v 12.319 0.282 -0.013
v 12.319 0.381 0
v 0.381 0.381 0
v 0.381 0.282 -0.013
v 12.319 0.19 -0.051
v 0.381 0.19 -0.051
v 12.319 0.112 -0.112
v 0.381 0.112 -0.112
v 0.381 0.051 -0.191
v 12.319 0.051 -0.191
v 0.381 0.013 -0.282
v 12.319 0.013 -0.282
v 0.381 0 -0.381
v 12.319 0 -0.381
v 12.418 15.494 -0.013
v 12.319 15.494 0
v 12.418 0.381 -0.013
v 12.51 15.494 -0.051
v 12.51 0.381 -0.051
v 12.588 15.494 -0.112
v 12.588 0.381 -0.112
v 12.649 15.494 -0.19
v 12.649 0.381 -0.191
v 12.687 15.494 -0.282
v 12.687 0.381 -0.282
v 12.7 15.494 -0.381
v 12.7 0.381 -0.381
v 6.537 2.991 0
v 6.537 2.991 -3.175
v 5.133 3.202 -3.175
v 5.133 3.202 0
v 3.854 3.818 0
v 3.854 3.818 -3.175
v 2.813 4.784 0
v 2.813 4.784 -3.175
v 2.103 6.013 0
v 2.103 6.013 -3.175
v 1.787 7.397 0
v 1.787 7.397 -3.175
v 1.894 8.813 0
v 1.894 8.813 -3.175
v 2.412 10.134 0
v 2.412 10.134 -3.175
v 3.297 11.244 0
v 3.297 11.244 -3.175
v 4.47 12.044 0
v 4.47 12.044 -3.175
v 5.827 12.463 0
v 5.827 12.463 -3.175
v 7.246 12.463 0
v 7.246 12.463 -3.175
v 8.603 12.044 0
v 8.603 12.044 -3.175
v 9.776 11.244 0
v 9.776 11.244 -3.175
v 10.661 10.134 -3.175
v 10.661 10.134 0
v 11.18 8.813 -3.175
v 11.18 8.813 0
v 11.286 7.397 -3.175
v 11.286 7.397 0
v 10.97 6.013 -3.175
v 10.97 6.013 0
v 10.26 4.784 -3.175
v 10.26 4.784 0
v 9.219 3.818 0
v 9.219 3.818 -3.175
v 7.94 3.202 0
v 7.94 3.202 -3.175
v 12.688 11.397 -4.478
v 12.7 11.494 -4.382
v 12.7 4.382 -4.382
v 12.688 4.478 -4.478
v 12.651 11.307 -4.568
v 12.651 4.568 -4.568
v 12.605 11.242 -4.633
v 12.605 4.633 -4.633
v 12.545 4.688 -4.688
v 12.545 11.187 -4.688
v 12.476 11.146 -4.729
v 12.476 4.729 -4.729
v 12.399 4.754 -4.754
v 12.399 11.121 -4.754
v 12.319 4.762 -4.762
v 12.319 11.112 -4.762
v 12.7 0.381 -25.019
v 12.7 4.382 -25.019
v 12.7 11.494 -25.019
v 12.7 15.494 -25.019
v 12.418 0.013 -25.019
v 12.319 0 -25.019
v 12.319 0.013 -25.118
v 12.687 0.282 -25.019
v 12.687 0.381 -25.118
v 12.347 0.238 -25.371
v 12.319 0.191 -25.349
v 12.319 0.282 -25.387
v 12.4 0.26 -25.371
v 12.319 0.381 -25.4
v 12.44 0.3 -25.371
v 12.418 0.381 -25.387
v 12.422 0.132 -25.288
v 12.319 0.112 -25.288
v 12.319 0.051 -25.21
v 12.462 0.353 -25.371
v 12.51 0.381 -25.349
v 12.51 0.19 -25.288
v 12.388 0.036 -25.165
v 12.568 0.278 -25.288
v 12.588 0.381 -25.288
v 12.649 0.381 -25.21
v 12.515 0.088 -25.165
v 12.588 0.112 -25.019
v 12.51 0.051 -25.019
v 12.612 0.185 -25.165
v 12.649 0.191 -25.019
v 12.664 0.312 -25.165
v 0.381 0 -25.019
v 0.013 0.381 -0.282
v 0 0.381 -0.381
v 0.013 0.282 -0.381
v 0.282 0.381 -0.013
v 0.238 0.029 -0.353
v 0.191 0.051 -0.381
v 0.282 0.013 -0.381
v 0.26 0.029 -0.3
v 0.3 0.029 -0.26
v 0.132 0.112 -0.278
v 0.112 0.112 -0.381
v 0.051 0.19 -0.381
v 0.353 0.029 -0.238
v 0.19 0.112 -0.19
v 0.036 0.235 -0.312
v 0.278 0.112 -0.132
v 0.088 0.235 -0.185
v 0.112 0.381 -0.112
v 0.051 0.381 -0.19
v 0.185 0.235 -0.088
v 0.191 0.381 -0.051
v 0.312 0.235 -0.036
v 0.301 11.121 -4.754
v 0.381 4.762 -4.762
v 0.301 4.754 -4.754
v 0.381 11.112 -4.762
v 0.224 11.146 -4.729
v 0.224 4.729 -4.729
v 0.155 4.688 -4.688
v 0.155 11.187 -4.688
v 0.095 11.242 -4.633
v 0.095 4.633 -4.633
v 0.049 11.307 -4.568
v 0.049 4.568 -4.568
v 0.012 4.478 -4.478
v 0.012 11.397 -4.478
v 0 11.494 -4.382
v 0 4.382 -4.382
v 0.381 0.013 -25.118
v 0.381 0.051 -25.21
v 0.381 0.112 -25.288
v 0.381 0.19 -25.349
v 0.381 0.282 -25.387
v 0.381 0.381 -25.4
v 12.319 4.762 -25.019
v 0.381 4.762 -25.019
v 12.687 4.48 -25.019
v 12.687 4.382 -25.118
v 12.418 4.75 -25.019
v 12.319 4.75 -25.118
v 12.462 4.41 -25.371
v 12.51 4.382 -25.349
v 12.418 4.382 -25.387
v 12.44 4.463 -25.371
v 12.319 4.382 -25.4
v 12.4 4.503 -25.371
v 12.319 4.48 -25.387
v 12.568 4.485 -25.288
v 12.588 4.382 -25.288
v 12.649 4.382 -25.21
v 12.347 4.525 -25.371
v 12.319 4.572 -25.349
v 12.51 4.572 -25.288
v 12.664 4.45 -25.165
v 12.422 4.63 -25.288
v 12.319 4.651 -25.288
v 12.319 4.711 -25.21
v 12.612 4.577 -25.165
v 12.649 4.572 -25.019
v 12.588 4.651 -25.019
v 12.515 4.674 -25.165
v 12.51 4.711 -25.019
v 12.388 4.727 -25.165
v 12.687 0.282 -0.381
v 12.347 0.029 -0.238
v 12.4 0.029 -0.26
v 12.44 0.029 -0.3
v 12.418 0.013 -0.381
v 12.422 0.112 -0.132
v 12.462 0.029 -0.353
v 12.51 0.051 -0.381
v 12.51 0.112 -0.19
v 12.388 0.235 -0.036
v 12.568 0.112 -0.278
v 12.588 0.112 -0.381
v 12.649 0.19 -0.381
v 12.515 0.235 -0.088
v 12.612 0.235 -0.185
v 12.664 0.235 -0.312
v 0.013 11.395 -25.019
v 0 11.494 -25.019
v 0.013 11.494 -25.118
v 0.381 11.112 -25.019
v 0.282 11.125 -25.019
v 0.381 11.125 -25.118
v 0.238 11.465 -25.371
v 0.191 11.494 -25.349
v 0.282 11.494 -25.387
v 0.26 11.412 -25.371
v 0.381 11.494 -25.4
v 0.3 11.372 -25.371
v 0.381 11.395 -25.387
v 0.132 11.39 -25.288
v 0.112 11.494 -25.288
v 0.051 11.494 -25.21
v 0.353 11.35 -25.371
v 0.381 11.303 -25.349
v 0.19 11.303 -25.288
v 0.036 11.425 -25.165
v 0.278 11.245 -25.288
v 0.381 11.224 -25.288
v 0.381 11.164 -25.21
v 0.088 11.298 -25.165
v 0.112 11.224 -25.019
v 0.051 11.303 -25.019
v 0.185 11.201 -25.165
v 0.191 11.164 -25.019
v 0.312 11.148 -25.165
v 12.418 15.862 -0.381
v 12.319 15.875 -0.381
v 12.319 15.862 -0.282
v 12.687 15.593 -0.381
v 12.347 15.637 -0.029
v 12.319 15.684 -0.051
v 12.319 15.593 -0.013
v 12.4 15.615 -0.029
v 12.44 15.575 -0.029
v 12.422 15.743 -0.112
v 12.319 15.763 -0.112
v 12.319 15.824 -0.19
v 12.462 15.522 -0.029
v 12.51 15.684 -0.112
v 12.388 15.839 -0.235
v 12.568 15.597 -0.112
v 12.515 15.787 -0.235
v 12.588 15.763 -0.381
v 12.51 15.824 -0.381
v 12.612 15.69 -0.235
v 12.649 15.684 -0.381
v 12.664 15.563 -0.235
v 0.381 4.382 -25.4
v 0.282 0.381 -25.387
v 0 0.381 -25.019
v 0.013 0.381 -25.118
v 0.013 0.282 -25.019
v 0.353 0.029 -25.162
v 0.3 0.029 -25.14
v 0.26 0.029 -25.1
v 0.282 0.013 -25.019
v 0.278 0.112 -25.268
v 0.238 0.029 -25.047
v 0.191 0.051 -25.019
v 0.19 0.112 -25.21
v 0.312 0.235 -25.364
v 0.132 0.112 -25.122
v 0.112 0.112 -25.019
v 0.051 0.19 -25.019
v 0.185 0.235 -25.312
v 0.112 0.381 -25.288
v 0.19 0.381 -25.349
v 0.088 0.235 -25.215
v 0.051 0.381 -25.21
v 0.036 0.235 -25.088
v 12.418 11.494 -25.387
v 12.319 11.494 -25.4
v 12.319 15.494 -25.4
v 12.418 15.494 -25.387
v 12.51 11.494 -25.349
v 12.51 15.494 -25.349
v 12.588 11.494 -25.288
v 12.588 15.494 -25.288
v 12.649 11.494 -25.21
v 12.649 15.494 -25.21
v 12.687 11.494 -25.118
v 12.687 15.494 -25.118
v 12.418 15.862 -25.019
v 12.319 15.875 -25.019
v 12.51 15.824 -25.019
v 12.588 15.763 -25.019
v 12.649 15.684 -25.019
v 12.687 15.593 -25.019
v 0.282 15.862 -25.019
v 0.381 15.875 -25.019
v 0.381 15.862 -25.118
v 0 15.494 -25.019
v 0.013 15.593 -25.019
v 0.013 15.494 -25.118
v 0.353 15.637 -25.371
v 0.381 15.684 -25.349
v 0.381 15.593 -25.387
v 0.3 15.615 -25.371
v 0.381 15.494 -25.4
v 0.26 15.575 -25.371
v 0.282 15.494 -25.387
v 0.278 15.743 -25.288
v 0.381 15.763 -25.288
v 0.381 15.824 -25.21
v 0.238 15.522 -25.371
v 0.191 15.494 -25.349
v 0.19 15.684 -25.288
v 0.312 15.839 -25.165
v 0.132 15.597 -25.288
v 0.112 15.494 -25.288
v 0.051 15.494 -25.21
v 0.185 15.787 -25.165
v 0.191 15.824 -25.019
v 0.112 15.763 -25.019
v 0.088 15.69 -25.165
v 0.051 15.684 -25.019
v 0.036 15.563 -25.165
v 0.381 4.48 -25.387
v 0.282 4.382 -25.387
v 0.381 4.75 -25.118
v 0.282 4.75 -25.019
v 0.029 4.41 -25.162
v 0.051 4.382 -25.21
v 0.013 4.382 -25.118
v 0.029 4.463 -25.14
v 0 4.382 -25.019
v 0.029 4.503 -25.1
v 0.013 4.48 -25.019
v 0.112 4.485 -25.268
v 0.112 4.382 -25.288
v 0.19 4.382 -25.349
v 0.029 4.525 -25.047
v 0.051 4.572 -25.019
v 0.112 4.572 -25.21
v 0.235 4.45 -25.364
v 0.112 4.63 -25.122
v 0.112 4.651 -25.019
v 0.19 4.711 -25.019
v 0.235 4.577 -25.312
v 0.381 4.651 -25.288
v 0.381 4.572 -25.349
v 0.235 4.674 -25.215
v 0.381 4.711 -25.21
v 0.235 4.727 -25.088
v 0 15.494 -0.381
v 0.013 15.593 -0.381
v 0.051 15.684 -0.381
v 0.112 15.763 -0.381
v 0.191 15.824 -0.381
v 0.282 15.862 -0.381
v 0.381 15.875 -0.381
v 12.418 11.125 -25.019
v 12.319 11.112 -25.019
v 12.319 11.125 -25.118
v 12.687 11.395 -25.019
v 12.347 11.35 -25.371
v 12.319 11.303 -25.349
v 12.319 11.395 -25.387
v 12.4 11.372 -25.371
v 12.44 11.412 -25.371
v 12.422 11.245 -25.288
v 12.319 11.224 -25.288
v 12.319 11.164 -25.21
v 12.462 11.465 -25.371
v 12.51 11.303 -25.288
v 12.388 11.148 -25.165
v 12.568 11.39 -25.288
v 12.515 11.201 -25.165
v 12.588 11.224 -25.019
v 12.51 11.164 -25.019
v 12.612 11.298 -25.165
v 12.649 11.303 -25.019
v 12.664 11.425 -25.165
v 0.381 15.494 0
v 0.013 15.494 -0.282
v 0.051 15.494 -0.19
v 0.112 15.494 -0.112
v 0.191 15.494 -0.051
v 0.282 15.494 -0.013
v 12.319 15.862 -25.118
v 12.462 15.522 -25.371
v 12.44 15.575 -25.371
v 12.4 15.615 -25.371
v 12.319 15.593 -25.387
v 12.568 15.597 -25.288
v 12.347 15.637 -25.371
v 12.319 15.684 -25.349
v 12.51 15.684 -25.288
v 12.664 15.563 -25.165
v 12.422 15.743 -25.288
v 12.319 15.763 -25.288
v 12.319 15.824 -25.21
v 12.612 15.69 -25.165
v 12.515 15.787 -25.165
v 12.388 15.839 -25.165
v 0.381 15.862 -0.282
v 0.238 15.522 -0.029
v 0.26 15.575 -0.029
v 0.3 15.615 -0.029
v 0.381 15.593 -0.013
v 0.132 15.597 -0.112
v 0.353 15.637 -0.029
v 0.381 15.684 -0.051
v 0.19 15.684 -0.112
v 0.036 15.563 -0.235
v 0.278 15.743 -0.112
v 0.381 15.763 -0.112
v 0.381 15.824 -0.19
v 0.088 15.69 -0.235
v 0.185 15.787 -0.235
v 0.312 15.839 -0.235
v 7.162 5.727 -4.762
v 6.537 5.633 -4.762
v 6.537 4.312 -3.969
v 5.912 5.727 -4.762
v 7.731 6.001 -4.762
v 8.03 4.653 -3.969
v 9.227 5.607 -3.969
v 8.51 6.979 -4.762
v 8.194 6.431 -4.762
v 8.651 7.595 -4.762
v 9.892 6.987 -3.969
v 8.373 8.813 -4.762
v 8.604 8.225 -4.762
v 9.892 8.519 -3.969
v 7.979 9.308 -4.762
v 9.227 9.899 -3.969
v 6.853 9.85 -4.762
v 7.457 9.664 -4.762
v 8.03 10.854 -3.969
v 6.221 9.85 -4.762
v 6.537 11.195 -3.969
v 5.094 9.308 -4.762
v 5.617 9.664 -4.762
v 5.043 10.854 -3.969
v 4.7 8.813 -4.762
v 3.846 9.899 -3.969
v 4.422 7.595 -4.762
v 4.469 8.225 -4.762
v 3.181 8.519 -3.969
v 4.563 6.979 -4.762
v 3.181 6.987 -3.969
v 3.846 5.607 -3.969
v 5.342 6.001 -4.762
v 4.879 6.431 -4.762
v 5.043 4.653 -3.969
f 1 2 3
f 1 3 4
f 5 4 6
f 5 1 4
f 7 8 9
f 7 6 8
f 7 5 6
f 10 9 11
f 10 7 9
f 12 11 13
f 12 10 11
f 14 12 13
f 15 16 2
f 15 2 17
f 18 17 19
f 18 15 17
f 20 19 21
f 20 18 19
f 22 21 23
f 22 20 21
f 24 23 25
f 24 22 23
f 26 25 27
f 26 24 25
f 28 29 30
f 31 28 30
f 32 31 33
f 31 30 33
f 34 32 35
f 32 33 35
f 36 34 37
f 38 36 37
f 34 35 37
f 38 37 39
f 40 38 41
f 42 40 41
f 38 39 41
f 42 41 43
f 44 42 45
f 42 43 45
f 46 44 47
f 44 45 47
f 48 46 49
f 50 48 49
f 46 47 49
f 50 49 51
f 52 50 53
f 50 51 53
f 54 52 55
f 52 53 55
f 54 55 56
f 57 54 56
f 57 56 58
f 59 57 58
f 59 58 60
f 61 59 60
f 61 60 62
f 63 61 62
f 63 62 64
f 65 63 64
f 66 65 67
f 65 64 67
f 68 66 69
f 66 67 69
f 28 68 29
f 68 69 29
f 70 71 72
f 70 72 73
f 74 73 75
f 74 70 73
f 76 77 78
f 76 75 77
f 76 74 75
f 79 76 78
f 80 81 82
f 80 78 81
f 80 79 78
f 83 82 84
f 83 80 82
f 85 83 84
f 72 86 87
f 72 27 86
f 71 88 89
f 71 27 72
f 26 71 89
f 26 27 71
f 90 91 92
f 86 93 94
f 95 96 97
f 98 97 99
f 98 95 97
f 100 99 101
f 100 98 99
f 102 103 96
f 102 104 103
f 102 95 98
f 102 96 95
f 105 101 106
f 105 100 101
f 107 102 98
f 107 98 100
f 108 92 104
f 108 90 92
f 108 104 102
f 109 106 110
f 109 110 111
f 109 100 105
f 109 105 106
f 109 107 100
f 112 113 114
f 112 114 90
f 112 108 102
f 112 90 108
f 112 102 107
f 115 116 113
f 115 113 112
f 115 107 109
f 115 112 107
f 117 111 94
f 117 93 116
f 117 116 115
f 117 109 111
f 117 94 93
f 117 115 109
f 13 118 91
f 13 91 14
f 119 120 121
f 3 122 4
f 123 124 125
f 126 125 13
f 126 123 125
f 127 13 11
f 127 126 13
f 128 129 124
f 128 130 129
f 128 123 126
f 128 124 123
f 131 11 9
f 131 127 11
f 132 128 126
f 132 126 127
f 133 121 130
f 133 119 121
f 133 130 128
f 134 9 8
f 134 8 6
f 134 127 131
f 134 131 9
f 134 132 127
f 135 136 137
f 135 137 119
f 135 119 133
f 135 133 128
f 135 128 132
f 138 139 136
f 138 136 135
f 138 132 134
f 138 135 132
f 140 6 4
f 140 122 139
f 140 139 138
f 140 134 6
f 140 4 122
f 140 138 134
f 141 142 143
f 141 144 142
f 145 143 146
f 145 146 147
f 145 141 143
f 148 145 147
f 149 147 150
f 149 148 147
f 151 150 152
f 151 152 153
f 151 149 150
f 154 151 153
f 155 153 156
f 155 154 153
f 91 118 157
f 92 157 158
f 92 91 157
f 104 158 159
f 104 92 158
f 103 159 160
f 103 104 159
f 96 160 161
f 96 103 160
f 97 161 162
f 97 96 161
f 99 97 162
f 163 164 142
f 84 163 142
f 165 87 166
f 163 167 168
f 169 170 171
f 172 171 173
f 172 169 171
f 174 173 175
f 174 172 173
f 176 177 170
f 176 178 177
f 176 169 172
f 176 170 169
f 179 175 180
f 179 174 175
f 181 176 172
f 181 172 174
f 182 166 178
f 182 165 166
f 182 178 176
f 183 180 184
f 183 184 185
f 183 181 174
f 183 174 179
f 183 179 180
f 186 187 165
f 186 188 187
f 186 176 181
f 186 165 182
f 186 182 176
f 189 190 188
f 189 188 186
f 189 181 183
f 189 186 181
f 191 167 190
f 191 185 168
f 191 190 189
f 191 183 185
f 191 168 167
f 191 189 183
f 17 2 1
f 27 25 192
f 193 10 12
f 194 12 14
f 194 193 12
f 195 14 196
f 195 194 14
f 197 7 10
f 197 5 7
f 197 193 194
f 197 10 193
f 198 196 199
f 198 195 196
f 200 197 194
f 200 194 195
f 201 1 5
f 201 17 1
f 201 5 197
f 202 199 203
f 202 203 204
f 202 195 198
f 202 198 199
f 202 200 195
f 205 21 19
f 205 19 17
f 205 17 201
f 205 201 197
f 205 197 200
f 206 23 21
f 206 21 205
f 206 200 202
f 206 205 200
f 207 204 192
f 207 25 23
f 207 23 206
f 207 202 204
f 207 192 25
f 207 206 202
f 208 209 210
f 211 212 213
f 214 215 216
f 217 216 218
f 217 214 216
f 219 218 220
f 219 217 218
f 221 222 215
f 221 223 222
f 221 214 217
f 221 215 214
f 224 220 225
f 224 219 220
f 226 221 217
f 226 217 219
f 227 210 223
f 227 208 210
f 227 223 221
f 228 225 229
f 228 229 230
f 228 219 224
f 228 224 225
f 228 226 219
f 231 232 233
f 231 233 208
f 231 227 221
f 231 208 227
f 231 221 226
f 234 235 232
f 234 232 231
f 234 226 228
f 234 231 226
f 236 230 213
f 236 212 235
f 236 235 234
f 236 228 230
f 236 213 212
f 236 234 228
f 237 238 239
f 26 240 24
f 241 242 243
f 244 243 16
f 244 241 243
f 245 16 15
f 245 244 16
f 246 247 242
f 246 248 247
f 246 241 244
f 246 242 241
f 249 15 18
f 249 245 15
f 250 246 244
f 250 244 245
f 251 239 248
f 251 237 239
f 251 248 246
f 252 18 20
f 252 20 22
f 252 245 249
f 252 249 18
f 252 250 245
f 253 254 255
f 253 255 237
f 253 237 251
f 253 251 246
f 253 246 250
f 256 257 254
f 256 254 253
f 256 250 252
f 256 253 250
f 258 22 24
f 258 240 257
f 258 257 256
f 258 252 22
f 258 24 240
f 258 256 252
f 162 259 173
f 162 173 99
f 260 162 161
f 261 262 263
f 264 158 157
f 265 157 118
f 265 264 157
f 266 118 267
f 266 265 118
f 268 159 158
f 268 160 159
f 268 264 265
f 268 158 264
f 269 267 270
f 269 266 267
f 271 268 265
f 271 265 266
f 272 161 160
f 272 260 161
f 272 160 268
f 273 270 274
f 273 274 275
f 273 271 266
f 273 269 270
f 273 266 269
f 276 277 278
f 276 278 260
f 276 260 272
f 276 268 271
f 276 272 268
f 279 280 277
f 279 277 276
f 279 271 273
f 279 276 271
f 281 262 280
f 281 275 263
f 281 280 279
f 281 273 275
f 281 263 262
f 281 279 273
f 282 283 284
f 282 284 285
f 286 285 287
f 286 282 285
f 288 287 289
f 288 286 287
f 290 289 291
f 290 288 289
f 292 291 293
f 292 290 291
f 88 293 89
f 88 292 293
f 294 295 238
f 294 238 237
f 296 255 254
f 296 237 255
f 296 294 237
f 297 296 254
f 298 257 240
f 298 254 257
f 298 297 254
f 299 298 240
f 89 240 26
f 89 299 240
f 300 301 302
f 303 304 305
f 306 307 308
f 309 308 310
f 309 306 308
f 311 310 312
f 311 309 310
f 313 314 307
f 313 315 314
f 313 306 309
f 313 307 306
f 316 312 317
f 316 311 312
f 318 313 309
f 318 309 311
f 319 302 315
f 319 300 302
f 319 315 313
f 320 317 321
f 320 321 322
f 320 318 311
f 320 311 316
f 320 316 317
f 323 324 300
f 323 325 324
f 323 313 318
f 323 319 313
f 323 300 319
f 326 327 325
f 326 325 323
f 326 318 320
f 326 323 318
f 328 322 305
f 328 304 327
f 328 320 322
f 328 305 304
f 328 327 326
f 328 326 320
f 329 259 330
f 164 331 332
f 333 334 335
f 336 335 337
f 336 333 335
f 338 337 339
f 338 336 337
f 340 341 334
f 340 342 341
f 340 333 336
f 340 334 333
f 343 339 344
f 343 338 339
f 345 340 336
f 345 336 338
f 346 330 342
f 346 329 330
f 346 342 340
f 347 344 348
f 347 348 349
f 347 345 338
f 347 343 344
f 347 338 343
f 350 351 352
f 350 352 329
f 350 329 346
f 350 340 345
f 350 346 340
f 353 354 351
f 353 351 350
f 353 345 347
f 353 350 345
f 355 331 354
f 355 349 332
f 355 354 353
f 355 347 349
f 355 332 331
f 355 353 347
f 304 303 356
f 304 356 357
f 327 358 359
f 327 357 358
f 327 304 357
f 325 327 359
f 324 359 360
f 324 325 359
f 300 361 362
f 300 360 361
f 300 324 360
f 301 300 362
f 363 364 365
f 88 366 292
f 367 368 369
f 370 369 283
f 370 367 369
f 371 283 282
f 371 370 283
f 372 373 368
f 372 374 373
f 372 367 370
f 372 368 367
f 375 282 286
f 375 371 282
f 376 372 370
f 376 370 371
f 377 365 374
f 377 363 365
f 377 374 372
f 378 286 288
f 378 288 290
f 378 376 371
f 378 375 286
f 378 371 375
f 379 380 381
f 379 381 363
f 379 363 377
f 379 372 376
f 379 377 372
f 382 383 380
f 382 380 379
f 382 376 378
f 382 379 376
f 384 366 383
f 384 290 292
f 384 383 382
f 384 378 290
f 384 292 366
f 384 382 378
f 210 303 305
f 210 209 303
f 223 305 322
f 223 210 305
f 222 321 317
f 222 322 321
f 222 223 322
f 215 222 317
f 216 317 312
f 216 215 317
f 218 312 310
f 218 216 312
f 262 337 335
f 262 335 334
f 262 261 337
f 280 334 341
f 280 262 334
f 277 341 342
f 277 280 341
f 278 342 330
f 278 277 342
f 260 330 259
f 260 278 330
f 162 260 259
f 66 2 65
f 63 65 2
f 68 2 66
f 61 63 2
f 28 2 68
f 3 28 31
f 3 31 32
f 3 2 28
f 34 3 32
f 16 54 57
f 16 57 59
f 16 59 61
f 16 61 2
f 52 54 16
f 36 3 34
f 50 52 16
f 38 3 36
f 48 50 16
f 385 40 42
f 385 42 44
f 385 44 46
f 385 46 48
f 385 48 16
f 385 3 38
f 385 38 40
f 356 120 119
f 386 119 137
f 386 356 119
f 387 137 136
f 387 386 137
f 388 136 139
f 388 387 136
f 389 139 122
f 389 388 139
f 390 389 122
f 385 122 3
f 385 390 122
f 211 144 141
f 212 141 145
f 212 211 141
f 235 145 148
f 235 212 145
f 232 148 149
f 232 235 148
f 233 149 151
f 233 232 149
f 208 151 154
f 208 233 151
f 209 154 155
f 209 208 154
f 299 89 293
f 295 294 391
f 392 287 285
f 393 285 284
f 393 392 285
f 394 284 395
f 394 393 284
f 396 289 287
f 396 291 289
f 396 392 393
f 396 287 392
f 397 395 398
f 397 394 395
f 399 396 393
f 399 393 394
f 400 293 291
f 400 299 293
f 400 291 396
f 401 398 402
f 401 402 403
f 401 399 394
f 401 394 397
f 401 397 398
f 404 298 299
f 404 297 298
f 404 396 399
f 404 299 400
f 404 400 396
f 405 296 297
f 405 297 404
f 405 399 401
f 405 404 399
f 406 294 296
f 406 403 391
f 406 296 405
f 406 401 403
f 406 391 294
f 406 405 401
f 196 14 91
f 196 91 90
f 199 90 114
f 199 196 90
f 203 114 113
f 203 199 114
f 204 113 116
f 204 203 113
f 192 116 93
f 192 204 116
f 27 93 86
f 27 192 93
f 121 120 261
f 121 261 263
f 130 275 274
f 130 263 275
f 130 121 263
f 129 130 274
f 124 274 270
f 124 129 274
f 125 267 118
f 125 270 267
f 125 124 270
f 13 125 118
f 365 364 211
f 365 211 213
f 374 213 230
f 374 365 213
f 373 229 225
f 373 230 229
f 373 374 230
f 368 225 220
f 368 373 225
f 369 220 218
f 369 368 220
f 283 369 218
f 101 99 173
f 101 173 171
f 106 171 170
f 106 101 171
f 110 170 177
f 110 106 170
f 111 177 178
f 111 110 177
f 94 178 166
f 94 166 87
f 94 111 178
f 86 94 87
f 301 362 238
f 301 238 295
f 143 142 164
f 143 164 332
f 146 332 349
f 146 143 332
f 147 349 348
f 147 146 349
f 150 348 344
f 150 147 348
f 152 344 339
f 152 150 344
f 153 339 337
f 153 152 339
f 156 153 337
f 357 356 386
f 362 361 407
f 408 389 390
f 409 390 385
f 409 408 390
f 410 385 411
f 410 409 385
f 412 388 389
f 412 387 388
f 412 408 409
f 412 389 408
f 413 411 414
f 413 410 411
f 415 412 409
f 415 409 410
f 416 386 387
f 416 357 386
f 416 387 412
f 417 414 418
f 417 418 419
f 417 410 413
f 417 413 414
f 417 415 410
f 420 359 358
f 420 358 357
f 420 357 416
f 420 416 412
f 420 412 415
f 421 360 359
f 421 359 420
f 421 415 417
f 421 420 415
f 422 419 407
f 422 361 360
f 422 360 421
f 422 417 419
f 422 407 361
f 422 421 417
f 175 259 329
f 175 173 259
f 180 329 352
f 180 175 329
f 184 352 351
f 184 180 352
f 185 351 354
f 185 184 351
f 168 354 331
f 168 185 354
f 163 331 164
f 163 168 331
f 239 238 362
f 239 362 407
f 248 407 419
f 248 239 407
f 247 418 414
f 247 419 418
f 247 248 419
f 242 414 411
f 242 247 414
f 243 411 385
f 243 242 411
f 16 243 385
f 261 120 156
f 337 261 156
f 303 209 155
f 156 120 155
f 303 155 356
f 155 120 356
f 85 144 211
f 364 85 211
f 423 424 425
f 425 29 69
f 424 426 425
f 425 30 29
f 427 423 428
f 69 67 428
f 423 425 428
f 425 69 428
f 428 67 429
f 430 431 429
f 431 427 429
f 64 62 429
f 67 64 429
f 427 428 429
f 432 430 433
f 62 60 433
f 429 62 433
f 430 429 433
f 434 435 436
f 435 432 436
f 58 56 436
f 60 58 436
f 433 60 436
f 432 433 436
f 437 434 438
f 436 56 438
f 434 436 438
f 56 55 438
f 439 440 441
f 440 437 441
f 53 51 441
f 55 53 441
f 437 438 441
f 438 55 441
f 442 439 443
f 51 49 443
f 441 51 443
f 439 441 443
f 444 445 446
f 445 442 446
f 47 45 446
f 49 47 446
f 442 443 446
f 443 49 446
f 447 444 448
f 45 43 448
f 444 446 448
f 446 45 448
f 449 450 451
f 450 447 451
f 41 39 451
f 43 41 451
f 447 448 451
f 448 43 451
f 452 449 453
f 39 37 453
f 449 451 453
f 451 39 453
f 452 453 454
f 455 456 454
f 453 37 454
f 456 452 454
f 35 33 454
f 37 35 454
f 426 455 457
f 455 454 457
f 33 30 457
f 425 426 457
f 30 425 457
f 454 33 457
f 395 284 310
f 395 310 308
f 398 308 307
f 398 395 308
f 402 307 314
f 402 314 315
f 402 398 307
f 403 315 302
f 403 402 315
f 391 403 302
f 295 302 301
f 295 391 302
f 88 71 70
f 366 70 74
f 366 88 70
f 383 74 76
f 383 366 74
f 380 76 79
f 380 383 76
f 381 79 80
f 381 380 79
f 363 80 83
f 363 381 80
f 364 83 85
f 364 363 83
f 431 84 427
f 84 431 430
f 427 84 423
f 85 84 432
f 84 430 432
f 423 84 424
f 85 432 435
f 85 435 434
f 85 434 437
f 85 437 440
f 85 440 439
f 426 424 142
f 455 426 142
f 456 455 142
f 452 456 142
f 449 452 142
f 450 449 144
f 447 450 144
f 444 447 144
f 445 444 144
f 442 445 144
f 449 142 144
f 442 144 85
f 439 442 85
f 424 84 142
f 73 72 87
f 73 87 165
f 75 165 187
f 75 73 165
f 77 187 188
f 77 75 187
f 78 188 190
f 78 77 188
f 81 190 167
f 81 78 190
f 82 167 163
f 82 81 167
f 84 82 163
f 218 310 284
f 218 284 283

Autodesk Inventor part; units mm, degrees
ref_plane "YZ Plane" through (0, 0, 0) normal (1, 0, 0) x (0, 1, 0)
ref_plane "XZ Plane" through (0, 0, 0) normal (0, 1, 0) x (-1, 0, 0)
ref_plane "XY Plane" through (0, 0, 0) normal (0, 0, 1) x (1, 0, 0)
sketch "Sketch1" plane through (0, 0, 0) normal (1, 0, 0) x (0, 1, 0)
  line L0 (0, 0) -> (15.875, 0)
  line L1 (15.875, 0) -> (15.875, -25.4)
  line L2 (0, -25.4) -> (0, 0)
  line L3 (4.7625, -25.4) -> (5.9323, -25.4)
  line L4 (4.7625, -25.4) -> (4.7625, -4.7625)
  line L5 (4.7625, -4.7625) -> (11.1125, -4.7625)
  line L6 (11.1125, -4.7625) -> (11.1125, -25.4)
  line L7 (15.875, -25.4) -> (11.1125, -25.4)
  line L8 (4.7625, -25.4) -> (0, -25.4)
  dimension "d1" = 25.4
  dimension "d4" = 6.35
  dimension "d6" = 4.7625
  dimension "d15" = 25.4
  dimension "d22" = 4.7625
  dimension "d24" = 4.7625
extrude "Extrusion1" add sketch "Sketch1" along normal blind 12.7
fillet "Fillet2" radius 0.381 22 edges at (12.7, 15.875, -12.7) (12.7, 11.1125, -15.0813) (0, 15.875, -12.7) (12.7, 7.9375, 0) (12.7, 7.9375, -4.7625) (12.7, 4.7625, -15.0812) (12.7, 0, -12.7) (12.7, 13.4938, -25.4) (12.7, 2.3813, -25.4) (6.35, 15.875, 0) (0, 7.9375, 0) (6.35, 0, 0) (6.35, 15.875, -25.4) (6.35, 4.7625, -25.4) (0, 11.1125, -15.0813) (0, 7.9375, -4.7625) (0, 4.7625, -15.0812) (6.35, 11.1125, -25.4) (0, 13.4938, -25.4) (0, 2.3813, -25.4) (0, 0, -12.7) (6.35, 0, -25.4)
sketch "Sketch6" plane through (0.381, 0.381, 0) normal (0, 0, 1) x (1, 0, 0)
  line L0 (0, 0) -> (0, 15.113) projected
  line L1 (11.938, 0) -> (0, 0) projected
  line L2 (11.938, 15.113) -> (11.938, 0) projected
  line L3 (0, 15.113) -> (11.938, 15.113) projected
  point P0 (-0.381, -0.381)
  point P1 (6.1556, 7.3722)
hole "Hole1" at (6.5366, 7.7532, 0) direction (0, 0, -1) diameter 3.81 end through all
sketch "Sketch7" plane through (0.381, 0.381, 0) normal (0, 0, 1) x (1, 0, 0)
  circle A0 centre (6.1556, 7.3722) radius 1.905 projected
  line L0 (0, 0) -> (0, 15.113) projected
  line L1 (11.938, 0) -> (0, 0) projected
  line L2 (11.938, 15.113) -> (11.938, 0) projected
  line L3 (0, 15.113) -> (11.938, 15.113) projected
  point P0 (-0.381, -0.381)
hole "Hole2" at (6.5366, 7.7532, 0) direction (0, 0, -1) diameter 9.525 depth 3.175 tip angle 118
equation "\"d15\" = d1"
properties part number "TensionerAxleHolder"
